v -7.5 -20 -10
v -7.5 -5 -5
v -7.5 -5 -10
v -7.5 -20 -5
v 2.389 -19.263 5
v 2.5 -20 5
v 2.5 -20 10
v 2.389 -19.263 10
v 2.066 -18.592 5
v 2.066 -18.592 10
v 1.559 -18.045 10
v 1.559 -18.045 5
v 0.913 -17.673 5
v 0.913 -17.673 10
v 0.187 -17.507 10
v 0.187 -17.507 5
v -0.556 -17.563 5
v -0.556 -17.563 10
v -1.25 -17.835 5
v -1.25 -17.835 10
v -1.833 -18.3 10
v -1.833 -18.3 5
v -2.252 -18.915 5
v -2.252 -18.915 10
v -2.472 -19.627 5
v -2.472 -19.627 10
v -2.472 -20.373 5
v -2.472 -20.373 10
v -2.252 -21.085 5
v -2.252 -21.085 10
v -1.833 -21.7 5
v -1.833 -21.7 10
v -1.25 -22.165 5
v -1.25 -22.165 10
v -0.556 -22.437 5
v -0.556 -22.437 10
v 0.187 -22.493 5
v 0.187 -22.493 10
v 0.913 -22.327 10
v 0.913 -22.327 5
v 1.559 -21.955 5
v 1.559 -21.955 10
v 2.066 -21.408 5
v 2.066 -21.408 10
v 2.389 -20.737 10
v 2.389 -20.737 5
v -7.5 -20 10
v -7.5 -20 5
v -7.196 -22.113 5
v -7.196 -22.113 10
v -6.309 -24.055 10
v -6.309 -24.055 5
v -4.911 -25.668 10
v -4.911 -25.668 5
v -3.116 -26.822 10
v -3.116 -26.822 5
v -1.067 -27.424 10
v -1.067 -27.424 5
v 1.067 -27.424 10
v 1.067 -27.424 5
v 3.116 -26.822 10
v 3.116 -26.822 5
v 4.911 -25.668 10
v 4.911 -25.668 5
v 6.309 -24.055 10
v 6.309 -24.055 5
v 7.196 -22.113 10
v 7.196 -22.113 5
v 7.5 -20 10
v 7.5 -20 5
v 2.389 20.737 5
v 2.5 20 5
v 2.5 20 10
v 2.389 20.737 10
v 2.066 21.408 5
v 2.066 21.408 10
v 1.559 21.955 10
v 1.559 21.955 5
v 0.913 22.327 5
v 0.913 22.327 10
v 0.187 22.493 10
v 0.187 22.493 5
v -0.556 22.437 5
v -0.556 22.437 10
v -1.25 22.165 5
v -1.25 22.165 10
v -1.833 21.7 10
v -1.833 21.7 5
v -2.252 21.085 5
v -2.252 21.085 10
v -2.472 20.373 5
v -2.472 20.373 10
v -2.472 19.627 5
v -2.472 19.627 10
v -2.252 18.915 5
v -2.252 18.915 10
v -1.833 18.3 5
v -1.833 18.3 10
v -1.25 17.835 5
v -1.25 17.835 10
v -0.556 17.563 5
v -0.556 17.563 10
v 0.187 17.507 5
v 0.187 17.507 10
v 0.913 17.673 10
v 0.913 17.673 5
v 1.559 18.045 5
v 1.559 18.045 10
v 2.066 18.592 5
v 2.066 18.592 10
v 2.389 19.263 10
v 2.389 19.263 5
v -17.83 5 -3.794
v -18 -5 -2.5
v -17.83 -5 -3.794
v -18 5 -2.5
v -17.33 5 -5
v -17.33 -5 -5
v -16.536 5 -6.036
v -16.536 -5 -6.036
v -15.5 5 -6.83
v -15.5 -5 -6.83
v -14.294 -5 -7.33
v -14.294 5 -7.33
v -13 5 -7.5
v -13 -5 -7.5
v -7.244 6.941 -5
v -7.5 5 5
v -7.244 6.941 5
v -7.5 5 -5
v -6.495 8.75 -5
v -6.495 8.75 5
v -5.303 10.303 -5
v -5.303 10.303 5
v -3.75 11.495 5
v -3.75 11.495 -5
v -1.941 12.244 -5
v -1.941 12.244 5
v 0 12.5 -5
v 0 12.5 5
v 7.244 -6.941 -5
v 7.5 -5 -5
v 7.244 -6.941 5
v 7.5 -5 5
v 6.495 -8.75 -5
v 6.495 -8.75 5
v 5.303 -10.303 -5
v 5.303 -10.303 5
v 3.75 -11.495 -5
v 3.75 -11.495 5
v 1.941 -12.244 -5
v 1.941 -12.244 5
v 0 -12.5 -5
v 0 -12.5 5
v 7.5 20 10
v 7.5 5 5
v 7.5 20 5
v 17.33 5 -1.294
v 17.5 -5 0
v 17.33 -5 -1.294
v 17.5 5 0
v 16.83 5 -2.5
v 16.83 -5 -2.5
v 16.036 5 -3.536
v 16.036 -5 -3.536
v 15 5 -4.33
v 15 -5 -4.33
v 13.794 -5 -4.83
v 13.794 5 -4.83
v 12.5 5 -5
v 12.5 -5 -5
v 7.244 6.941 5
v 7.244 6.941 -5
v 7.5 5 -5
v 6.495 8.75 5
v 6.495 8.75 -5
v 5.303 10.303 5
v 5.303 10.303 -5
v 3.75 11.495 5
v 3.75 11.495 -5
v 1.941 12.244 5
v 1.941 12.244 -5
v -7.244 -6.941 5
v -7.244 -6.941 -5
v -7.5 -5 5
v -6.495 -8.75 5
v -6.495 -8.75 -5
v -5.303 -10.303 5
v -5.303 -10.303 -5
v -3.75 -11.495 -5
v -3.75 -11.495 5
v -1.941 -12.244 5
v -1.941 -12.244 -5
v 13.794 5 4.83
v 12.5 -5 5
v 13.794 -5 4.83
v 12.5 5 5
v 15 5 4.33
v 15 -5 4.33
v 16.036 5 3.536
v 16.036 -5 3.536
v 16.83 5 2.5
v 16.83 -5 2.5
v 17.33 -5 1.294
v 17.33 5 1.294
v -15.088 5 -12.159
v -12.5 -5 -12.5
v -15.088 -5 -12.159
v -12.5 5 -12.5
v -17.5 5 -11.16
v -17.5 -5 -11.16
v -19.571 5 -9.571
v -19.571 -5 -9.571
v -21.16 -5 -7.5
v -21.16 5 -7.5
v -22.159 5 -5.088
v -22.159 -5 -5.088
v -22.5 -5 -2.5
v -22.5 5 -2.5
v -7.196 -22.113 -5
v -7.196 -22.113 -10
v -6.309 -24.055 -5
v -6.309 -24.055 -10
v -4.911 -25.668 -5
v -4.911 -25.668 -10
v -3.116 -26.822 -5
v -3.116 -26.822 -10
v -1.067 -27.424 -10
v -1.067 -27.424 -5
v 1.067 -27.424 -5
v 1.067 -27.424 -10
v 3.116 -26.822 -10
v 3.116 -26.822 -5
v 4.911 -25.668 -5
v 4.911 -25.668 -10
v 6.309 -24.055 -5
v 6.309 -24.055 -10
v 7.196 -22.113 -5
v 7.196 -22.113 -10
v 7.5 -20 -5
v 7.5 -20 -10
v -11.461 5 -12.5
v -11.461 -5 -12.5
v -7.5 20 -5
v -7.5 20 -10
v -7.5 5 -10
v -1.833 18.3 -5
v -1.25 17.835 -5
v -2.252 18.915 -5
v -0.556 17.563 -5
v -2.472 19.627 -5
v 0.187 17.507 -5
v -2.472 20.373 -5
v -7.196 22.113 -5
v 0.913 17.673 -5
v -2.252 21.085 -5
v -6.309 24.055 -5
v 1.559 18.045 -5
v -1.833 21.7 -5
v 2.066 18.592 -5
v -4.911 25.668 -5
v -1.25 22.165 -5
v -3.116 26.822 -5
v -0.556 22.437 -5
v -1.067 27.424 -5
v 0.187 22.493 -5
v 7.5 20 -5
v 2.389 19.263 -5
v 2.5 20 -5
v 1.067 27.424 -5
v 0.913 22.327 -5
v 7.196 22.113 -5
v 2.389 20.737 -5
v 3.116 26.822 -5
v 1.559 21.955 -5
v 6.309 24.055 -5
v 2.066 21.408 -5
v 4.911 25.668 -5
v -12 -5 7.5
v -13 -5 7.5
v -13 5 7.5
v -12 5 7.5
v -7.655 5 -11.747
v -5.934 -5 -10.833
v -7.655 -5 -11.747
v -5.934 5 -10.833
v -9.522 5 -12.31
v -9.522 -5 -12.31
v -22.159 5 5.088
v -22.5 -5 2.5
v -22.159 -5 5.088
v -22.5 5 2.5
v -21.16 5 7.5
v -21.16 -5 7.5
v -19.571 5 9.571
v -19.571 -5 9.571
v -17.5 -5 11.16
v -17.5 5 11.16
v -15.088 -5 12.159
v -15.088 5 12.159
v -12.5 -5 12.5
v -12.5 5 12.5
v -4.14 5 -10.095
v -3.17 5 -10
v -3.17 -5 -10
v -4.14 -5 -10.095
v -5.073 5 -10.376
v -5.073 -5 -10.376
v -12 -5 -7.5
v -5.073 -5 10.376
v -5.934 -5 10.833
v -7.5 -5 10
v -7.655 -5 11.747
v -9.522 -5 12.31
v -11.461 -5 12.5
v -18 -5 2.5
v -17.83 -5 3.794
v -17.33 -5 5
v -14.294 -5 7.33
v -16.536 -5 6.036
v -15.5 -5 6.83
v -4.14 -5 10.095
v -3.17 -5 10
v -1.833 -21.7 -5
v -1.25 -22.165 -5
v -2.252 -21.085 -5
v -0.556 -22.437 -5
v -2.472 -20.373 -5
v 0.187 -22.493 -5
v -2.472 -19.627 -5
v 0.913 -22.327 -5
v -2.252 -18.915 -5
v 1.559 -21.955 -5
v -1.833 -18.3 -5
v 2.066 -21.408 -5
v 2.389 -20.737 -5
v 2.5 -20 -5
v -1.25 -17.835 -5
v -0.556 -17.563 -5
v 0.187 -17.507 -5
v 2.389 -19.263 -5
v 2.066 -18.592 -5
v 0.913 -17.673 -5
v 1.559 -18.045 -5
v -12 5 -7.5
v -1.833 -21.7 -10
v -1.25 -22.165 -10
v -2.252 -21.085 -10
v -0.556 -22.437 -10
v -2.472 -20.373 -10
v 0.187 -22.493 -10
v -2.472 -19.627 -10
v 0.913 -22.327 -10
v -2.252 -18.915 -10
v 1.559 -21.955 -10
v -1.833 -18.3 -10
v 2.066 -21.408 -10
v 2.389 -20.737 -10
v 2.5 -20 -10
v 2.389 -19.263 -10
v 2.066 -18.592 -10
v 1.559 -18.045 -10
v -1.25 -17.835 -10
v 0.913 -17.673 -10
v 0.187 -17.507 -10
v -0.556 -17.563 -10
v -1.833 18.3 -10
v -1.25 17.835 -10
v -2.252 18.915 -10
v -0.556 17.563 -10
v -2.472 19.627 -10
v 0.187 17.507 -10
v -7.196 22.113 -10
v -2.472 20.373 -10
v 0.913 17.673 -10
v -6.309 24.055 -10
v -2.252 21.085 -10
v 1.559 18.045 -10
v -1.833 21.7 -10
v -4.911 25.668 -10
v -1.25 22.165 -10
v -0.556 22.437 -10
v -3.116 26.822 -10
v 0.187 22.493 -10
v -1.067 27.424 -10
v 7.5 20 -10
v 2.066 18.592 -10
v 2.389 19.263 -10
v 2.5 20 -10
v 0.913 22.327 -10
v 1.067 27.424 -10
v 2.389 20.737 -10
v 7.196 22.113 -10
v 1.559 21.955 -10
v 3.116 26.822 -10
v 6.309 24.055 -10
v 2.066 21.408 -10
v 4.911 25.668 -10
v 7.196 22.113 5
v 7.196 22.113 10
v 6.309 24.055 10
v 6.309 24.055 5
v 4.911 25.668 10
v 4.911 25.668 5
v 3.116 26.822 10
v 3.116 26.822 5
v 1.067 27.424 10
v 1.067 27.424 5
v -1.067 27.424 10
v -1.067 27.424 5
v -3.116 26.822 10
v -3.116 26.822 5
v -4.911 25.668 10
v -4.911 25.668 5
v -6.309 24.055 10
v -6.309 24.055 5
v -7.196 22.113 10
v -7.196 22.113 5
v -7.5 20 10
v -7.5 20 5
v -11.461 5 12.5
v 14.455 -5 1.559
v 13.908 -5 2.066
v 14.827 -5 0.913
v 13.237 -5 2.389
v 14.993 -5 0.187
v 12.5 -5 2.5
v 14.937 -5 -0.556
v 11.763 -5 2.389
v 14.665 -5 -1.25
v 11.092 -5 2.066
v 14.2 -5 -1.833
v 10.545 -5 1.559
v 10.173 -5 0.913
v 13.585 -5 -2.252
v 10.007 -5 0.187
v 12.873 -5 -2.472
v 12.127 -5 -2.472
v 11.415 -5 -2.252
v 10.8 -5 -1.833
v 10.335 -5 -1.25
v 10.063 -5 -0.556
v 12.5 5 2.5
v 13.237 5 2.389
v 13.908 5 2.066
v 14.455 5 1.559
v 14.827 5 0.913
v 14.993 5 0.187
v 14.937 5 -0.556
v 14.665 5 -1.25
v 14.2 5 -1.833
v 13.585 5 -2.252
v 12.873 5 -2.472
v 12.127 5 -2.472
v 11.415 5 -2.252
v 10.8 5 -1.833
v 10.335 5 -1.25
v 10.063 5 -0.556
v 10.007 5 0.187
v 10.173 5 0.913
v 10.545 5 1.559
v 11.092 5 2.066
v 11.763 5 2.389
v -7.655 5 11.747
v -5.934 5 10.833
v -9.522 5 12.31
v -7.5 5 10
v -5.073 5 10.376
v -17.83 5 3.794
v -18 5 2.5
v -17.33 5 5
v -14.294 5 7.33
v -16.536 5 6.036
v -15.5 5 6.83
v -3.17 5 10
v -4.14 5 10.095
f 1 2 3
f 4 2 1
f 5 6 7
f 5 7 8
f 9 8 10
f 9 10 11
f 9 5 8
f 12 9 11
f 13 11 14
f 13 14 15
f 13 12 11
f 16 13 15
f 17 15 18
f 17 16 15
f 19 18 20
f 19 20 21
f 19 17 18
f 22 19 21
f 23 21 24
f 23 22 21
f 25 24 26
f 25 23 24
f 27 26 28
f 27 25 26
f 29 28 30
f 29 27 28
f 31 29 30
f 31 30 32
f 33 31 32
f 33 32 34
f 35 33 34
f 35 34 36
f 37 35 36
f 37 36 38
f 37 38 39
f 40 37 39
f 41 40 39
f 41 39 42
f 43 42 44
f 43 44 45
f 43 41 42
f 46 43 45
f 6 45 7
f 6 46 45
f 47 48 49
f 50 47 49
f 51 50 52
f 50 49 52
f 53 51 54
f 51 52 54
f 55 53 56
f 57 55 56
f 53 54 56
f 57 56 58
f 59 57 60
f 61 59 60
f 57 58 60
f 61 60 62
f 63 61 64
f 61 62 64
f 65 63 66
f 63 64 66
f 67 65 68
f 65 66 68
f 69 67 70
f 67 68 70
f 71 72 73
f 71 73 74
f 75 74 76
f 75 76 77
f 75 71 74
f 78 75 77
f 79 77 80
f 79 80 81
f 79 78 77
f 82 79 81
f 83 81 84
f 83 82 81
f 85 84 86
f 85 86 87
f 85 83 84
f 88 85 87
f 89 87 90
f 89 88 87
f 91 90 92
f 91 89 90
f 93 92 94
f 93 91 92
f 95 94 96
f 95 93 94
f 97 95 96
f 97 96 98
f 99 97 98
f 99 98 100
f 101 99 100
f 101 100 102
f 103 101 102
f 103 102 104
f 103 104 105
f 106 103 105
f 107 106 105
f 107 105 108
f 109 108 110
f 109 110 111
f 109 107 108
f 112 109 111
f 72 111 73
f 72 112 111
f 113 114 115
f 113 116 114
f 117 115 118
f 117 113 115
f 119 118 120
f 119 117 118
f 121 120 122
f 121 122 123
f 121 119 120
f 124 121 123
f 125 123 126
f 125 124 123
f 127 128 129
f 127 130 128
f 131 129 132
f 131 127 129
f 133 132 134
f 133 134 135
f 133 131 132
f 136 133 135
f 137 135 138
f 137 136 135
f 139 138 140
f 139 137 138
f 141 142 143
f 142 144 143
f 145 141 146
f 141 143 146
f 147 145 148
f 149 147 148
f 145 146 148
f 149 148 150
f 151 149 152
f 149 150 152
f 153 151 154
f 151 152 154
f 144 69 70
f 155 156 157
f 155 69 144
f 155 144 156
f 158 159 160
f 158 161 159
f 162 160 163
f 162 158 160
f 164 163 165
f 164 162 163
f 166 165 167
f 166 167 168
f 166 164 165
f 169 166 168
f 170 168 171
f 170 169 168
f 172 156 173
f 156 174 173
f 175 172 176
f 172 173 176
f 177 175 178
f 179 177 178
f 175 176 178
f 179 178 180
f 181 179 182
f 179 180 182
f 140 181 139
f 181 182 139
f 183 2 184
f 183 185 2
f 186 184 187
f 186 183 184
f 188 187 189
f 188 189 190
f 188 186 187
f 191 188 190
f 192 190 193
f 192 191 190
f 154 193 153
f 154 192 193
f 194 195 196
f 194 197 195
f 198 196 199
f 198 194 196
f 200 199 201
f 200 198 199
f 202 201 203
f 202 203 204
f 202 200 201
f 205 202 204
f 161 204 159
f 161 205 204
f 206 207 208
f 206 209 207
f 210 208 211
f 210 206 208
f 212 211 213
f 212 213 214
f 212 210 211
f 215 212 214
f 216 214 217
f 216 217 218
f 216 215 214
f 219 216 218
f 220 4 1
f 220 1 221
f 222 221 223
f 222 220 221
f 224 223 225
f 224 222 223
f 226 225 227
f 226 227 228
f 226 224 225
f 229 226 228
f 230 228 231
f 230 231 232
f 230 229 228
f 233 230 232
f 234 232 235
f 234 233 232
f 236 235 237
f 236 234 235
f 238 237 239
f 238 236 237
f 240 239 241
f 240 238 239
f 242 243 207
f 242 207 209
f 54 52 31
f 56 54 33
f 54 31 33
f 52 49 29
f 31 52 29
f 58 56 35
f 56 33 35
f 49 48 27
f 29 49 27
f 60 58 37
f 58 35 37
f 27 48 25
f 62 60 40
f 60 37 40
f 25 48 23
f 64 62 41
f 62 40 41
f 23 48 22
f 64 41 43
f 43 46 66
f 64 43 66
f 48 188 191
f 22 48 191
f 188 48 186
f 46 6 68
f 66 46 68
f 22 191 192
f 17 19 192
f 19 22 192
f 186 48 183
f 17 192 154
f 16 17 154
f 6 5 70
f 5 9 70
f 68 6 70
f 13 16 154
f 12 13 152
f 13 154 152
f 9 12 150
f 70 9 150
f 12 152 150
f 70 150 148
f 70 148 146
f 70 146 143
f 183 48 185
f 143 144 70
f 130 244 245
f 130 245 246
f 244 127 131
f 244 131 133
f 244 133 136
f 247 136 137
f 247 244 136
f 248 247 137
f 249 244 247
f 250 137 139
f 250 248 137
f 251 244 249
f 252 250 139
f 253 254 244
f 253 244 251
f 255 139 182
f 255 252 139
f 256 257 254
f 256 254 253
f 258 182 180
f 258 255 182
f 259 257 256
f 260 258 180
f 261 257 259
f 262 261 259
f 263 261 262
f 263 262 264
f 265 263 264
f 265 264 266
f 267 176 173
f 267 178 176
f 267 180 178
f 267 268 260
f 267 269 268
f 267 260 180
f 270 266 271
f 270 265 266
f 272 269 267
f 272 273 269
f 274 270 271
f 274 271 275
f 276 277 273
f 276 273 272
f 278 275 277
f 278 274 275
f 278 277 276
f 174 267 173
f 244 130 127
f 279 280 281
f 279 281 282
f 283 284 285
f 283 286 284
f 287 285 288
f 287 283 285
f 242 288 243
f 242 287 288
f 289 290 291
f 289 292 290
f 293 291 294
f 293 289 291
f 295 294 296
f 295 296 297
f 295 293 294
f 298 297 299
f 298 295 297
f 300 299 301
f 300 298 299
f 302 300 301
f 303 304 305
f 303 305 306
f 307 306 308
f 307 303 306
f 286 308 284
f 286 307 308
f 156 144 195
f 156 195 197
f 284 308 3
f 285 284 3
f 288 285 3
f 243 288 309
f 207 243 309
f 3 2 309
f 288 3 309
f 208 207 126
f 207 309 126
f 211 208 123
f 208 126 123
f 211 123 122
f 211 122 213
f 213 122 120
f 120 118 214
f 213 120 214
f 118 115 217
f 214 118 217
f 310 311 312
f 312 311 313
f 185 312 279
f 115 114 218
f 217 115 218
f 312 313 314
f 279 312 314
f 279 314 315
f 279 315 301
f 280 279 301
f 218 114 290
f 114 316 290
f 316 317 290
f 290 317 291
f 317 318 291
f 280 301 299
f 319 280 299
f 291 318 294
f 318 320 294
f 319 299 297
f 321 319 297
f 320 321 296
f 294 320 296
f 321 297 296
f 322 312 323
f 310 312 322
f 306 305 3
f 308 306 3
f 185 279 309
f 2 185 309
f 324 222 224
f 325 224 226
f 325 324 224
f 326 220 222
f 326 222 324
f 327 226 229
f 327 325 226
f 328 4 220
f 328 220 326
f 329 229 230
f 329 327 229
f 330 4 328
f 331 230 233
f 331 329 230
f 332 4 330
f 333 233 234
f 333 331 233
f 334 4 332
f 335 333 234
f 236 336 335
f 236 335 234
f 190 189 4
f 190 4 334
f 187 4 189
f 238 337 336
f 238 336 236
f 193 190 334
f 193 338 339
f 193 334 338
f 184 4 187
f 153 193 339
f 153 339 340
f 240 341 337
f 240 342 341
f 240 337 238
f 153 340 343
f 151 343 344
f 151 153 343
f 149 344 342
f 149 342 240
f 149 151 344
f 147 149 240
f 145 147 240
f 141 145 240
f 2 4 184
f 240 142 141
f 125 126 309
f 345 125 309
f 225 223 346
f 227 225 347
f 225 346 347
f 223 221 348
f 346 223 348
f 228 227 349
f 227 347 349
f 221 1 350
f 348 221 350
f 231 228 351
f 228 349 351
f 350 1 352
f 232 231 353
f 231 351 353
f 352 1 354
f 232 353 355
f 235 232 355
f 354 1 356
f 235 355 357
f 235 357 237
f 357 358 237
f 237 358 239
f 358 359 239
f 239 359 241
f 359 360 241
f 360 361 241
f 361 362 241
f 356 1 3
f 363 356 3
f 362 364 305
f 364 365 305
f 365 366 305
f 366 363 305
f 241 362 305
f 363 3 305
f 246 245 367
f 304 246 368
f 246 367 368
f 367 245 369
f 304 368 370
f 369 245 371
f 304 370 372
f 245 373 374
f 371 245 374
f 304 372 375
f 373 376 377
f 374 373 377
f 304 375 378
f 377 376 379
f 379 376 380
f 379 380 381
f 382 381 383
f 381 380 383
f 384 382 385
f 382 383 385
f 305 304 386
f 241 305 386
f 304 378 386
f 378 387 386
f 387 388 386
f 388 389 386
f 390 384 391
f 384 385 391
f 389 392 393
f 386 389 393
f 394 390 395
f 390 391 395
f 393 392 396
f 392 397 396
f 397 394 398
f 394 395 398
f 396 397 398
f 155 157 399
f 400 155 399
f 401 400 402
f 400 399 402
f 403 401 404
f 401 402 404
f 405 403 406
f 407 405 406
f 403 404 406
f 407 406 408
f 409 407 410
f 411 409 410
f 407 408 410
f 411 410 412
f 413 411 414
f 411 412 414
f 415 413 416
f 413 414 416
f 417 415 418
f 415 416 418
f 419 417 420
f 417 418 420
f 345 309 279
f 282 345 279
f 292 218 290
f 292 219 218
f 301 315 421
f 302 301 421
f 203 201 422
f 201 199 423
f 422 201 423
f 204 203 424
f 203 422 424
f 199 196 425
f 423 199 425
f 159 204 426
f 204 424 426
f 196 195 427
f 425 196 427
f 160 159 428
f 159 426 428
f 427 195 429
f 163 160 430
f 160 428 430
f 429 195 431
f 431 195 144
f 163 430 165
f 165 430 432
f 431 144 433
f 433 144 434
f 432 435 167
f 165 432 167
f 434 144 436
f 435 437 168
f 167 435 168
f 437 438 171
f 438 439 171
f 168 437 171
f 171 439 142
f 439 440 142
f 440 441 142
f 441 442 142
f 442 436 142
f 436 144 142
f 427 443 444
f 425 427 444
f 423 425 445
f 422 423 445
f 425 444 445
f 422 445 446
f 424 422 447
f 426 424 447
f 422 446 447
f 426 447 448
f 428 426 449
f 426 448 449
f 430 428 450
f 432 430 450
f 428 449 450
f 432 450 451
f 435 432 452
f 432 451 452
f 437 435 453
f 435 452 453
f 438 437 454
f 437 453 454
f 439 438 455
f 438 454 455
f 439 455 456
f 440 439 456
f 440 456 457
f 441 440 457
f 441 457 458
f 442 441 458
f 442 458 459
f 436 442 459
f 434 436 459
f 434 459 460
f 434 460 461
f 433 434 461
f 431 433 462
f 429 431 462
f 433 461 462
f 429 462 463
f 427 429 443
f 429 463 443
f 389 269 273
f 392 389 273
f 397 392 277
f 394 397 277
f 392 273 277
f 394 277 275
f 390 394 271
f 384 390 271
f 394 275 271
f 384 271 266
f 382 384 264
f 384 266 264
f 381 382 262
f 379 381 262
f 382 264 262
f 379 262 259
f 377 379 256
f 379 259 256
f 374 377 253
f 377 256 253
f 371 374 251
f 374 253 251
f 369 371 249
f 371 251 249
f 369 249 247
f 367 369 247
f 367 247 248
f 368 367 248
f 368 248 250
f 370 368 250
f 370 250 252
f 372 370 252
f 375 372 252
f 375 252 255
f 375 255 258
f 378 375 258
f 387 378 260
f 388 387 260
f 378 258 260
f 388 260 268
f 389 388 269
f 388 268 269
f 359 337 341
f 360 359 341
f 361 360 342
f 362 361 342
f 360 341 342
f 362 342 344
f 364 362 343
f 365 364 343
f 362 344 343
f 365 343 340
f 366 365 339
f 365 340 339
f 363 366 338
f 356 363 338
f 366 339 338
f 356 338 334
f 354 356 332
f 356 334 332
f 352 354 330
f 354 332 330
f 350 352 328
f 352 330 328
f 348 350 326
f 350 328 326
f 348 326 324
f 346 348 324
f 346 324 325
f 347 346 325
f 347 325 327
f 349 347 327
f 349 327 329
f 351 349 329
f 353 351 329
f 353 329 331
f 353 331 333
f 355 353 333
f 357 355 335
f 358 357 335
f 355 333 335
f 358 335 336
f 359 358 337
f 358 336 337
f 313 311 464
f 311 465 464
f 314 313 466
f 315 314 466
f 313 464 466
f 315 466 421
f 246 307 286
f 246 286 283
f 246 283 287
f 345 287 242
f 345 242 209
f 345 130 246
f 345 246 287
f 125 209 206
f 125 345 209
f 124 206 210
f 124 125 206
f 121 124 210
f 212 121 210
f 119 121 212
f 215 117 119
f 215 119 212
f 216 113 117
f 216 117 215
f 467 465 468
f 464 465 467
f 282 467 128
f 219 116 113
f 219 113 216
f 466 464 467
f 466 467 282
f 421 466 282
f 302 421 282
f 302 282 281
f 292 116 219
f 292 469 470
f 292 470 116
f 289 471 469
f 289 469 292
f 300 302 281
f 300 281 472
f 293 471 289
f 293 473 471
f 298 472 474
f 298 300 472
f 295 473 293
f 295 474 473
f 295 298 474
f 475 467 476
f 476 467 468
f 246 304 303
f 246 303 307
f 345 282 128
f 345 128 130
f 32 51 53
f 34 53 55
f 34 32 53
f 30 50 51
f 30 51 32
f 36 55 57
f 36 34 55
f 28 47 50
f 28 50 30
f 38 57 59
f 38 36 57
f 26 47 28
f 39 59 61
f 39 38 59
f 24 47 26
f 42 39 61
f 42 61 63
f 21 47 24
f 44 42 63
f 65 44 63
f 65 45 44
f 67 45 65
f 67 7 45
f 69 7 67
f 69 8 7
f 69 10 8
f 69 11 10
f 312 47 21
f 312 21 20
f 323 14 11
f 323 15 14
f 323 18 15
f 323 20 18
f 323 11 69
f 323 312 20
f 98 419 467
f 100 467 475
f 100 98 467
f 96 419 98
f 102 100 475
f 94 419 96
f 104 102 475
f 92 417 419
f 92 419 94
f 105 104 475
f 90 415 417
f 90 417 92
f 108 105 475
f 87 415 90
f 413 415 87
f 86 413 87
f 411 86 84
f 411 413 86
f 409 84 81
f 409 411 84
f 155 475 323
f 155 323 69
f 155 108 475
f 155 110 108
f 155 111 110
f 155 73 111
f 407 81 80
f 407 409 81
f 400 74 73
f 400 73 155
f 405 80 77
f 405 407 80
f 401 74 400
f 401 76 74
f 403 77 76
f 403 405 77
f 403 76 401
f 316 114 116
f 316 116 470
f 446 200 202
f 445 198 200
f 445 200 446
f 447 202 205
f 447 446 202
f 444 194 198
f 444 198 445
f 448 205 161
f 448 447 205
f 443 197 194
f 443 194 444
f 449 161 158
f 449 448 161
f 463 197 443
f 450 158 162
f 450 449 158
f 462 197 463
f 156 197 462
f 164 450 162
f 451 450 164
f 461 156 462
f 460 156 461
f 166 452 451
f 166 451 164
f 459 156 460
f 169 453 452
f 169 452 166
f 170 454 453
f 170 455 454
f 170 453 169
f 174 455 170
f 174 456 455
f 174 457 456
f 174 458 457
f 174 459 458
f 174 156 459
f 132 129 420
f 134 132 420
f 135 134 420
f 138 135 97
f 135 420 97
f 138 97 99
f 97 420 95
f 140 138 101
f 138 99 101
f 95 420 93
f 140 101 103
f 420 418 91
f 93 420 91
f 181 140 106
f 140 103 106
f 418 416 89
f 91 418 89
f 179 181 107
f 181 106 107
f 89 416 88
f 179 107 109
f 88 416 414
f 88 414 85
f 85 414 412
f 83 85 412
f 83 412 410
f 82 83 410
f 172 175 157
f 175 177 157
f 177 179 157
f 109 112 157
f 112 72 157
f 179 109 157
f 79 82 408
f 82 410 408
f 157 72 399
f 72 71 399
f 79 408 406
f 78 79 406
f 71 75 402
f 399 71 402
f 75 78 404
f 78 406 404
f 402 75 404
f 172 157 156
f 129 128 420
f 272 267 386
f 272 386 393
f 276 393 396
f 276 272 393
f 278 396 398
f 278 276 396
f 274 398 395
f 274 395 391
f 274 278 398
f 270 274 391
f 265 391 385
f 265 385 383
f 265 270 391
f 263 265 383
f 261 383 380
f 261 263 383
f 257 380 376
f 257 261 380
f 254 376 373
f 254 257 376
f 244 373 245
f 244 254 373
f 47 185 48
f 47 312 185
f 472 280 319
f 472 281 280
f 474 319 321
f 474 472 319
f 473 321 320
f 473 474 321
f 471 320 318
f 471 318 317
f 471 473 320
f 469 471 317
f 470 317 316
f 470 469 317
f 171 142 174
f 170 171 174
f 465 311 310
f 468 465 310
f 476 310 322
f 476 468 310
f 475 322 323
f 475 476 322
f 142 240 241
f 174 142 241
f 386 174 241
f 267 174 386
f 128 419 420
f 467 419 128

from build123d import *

# Parameters (mm, degrees)
SKETCH1_W           = 15
SKETCH1_H           = 25
BOSS_EXTRUDE1_DEPTH = 5
SKETCH2_R           = 2.5
BOSS_EXTRUDE2_DEPTH = 5
FILLET1_R           = 7.5
SKETCH3_W           = 10
SKETCH3_H           = 10
BOSS_EXTRUDE3_DEPTH = 10
FILLET2_R           = 5
SKETCH4_R           = 2.5
CUT_EXTRUDE1_DEPTH  = 10
SKETCH5_W           = 25
SKETCH5_H           = 10
BOSS_EXTRUDE4_DEPTH = 15
SKETCH6_W           = 6
SKETCH6_H           = 15
CUT_EXTRUDE2_DEPTH  = 15
FILLET3_R           = 5
FILLET4_R           = 10
FILLET5_R           = 5


# Some blends are built 0.0001 mm under size
with BuildPart() as part:
    # Sketch1 → Boss-Extrude1 (new, symmetric)
    with BuildSketch(Plane.XY):
        Rectangle(SKETCH1_W, SKETCH1_H)
    extrude(amount=BOSS_EXTRUDE1_DEPTH, both=True)

    # Sketch2 → Boss-Extrude2 (add)
    with BuildSketch(Plane.XY.offset(5)):
        with BuildLine():
            ThreePointArc((-7.5, -20), (0, -27.5), (7.5, -20))
            Line((7.5, -20), (7.5, 20))
            ThreePointArc((7.5, 20), (0, 27.5), (-7.5, 20))
            Line((-7.5, 20), (-7.5, -20))
        make_face()
        with Locations((0, -20)):
            Circle(SKETCH2_R, mode=Mode.SUBTRACT)
        with Locations((0, 20)):
            Circle(SKETCH2_R, mode=Mode.SUBTRACT)
    boss_extrude2 = extrude(amount=BOSS_EXTRUDE2_DEPTH)

    # Mirror1: Boss-Extrude2 across plane
    add(boss_extrude2.mirror(Plane.XY))

    # Fillet1
    fillet1_edges = [part.edges().sort_by_distance(p)[0] for p in [
        (7.5, -12.5, 0),
        (-7.5, -12.5, 0),
        (-7.5, 12.5, 0),
        (7.5, 12.5, 0),
    ]]
    fillet(fillet1_edges, radius=FILLET1_R - 0.0001)  # a hair under: the kernel refuses the full size

    # Sketch3 → Boss-Extrude3 (add)
    with BuildSketch(Plane(origin=(7.5, 0, 0), x_dir=(0, 0, -1), z_dir=(1, 0, 0))):
        Rectangle(SKETCH3_W, SKETCH3_H)
    extrude(amount=BOSS_EXTRUDE3_DEPTH)

    # Fillet2
    fillet2_edges = [part.edges().sort_by_distance(p)[0] for p in [
        (17.5, 0, 5),
        (17.5, 0, -5),
    ]]
    fillet(fillet2_edges, radius=FILLET2_R - 0.0001)  # a hair under: the kernel refuses the full size

    # Sketch4 → Cut-Extrude1 (cut)
    with BuildSketch(Plane(origin=(0, 5, 0), x_dir=(1, 0, 0), z_dir=(0, 1, 0))):
        with Locations(Location((12.5, 0, 0), (0, 0, 270))):
            Circle(SKETCH4_R)
    extrude(amount=-CUT_EXTRUDE1_DEPTH, mode=Mode.SUBTRACT)

    # Sketch5 → Boss-Extrude4 (add)
    with BuildSketch(Plane.ZY.offset(7.5)):
        Rectangle(SKETCH5_W, SKETCH5_H)
    extrude(amount=BOSS_EXTRUDE4_DEPTH)

    # Sketch6 → Cut-Extrude2 (cut)
    with BuildSketch(Plane.XZ.offset(5)):
        with Locations((-15, 0)):
            Rectangle(SKETCH6_W, SKETCH6_H)
    extrude(amount=-CUT_EXTRUDE2_DEPTH, mode=Mode.SUBTRACT)

    # Fillet3
    # the kernel refuses this fillet: 5 mm, written as the material it adds along each edge
    with BuildSketch(Plane(origin=(-7.5, 5, 10), x_dir=(1, 0, 0), z_dir=(0, -1, 0))) as fillet3_piece_1:
        with BuildLine():
            CenterArc((4.330127019, 5), FILLET3_R, 210, 60)
            Line((0, 2.5), (0, 0))
            Line((0, 0), (4.330127019, 0))
        make_face()
    extrude(amount=10)
    with BuildSketch(Plane(origin=(-7.5, 5, -10), x_dir=(1, 0, 0), z_dir=(0, -1, 0))) as fillet3_piece_2:
        with BuildLine():
            CenterArc((4.330127019, -5), FILLET3_R, 90, 60)
            Line((0, -2.5), (0, 0))
            Line((0, 0), (4.330127019, 0))
        make_face()
    extrude(amount=10)

    # Fillet4
    fillet4_edges = [part.edges().sort_by_distance(p)[0] for p in [
        (-7.5, 0, 12.5),
        (-7.5, 0, -12.5),
        (-22.5, 0, 12.5),
        (-22.5, 0, -12.5),
    ]]
    fillet(fillet4_edges, radius=FILLET4_R)

    # Fillet5
    fillet5_edges = [part.edges().sort_by_distance(p)[0] for p in [
        (-18, 0, -7.5),
        (-18, 0, 7.5),
    ]]
    fillet(fillet5_edges, radius=FILLET5_R)


solid = part.part
